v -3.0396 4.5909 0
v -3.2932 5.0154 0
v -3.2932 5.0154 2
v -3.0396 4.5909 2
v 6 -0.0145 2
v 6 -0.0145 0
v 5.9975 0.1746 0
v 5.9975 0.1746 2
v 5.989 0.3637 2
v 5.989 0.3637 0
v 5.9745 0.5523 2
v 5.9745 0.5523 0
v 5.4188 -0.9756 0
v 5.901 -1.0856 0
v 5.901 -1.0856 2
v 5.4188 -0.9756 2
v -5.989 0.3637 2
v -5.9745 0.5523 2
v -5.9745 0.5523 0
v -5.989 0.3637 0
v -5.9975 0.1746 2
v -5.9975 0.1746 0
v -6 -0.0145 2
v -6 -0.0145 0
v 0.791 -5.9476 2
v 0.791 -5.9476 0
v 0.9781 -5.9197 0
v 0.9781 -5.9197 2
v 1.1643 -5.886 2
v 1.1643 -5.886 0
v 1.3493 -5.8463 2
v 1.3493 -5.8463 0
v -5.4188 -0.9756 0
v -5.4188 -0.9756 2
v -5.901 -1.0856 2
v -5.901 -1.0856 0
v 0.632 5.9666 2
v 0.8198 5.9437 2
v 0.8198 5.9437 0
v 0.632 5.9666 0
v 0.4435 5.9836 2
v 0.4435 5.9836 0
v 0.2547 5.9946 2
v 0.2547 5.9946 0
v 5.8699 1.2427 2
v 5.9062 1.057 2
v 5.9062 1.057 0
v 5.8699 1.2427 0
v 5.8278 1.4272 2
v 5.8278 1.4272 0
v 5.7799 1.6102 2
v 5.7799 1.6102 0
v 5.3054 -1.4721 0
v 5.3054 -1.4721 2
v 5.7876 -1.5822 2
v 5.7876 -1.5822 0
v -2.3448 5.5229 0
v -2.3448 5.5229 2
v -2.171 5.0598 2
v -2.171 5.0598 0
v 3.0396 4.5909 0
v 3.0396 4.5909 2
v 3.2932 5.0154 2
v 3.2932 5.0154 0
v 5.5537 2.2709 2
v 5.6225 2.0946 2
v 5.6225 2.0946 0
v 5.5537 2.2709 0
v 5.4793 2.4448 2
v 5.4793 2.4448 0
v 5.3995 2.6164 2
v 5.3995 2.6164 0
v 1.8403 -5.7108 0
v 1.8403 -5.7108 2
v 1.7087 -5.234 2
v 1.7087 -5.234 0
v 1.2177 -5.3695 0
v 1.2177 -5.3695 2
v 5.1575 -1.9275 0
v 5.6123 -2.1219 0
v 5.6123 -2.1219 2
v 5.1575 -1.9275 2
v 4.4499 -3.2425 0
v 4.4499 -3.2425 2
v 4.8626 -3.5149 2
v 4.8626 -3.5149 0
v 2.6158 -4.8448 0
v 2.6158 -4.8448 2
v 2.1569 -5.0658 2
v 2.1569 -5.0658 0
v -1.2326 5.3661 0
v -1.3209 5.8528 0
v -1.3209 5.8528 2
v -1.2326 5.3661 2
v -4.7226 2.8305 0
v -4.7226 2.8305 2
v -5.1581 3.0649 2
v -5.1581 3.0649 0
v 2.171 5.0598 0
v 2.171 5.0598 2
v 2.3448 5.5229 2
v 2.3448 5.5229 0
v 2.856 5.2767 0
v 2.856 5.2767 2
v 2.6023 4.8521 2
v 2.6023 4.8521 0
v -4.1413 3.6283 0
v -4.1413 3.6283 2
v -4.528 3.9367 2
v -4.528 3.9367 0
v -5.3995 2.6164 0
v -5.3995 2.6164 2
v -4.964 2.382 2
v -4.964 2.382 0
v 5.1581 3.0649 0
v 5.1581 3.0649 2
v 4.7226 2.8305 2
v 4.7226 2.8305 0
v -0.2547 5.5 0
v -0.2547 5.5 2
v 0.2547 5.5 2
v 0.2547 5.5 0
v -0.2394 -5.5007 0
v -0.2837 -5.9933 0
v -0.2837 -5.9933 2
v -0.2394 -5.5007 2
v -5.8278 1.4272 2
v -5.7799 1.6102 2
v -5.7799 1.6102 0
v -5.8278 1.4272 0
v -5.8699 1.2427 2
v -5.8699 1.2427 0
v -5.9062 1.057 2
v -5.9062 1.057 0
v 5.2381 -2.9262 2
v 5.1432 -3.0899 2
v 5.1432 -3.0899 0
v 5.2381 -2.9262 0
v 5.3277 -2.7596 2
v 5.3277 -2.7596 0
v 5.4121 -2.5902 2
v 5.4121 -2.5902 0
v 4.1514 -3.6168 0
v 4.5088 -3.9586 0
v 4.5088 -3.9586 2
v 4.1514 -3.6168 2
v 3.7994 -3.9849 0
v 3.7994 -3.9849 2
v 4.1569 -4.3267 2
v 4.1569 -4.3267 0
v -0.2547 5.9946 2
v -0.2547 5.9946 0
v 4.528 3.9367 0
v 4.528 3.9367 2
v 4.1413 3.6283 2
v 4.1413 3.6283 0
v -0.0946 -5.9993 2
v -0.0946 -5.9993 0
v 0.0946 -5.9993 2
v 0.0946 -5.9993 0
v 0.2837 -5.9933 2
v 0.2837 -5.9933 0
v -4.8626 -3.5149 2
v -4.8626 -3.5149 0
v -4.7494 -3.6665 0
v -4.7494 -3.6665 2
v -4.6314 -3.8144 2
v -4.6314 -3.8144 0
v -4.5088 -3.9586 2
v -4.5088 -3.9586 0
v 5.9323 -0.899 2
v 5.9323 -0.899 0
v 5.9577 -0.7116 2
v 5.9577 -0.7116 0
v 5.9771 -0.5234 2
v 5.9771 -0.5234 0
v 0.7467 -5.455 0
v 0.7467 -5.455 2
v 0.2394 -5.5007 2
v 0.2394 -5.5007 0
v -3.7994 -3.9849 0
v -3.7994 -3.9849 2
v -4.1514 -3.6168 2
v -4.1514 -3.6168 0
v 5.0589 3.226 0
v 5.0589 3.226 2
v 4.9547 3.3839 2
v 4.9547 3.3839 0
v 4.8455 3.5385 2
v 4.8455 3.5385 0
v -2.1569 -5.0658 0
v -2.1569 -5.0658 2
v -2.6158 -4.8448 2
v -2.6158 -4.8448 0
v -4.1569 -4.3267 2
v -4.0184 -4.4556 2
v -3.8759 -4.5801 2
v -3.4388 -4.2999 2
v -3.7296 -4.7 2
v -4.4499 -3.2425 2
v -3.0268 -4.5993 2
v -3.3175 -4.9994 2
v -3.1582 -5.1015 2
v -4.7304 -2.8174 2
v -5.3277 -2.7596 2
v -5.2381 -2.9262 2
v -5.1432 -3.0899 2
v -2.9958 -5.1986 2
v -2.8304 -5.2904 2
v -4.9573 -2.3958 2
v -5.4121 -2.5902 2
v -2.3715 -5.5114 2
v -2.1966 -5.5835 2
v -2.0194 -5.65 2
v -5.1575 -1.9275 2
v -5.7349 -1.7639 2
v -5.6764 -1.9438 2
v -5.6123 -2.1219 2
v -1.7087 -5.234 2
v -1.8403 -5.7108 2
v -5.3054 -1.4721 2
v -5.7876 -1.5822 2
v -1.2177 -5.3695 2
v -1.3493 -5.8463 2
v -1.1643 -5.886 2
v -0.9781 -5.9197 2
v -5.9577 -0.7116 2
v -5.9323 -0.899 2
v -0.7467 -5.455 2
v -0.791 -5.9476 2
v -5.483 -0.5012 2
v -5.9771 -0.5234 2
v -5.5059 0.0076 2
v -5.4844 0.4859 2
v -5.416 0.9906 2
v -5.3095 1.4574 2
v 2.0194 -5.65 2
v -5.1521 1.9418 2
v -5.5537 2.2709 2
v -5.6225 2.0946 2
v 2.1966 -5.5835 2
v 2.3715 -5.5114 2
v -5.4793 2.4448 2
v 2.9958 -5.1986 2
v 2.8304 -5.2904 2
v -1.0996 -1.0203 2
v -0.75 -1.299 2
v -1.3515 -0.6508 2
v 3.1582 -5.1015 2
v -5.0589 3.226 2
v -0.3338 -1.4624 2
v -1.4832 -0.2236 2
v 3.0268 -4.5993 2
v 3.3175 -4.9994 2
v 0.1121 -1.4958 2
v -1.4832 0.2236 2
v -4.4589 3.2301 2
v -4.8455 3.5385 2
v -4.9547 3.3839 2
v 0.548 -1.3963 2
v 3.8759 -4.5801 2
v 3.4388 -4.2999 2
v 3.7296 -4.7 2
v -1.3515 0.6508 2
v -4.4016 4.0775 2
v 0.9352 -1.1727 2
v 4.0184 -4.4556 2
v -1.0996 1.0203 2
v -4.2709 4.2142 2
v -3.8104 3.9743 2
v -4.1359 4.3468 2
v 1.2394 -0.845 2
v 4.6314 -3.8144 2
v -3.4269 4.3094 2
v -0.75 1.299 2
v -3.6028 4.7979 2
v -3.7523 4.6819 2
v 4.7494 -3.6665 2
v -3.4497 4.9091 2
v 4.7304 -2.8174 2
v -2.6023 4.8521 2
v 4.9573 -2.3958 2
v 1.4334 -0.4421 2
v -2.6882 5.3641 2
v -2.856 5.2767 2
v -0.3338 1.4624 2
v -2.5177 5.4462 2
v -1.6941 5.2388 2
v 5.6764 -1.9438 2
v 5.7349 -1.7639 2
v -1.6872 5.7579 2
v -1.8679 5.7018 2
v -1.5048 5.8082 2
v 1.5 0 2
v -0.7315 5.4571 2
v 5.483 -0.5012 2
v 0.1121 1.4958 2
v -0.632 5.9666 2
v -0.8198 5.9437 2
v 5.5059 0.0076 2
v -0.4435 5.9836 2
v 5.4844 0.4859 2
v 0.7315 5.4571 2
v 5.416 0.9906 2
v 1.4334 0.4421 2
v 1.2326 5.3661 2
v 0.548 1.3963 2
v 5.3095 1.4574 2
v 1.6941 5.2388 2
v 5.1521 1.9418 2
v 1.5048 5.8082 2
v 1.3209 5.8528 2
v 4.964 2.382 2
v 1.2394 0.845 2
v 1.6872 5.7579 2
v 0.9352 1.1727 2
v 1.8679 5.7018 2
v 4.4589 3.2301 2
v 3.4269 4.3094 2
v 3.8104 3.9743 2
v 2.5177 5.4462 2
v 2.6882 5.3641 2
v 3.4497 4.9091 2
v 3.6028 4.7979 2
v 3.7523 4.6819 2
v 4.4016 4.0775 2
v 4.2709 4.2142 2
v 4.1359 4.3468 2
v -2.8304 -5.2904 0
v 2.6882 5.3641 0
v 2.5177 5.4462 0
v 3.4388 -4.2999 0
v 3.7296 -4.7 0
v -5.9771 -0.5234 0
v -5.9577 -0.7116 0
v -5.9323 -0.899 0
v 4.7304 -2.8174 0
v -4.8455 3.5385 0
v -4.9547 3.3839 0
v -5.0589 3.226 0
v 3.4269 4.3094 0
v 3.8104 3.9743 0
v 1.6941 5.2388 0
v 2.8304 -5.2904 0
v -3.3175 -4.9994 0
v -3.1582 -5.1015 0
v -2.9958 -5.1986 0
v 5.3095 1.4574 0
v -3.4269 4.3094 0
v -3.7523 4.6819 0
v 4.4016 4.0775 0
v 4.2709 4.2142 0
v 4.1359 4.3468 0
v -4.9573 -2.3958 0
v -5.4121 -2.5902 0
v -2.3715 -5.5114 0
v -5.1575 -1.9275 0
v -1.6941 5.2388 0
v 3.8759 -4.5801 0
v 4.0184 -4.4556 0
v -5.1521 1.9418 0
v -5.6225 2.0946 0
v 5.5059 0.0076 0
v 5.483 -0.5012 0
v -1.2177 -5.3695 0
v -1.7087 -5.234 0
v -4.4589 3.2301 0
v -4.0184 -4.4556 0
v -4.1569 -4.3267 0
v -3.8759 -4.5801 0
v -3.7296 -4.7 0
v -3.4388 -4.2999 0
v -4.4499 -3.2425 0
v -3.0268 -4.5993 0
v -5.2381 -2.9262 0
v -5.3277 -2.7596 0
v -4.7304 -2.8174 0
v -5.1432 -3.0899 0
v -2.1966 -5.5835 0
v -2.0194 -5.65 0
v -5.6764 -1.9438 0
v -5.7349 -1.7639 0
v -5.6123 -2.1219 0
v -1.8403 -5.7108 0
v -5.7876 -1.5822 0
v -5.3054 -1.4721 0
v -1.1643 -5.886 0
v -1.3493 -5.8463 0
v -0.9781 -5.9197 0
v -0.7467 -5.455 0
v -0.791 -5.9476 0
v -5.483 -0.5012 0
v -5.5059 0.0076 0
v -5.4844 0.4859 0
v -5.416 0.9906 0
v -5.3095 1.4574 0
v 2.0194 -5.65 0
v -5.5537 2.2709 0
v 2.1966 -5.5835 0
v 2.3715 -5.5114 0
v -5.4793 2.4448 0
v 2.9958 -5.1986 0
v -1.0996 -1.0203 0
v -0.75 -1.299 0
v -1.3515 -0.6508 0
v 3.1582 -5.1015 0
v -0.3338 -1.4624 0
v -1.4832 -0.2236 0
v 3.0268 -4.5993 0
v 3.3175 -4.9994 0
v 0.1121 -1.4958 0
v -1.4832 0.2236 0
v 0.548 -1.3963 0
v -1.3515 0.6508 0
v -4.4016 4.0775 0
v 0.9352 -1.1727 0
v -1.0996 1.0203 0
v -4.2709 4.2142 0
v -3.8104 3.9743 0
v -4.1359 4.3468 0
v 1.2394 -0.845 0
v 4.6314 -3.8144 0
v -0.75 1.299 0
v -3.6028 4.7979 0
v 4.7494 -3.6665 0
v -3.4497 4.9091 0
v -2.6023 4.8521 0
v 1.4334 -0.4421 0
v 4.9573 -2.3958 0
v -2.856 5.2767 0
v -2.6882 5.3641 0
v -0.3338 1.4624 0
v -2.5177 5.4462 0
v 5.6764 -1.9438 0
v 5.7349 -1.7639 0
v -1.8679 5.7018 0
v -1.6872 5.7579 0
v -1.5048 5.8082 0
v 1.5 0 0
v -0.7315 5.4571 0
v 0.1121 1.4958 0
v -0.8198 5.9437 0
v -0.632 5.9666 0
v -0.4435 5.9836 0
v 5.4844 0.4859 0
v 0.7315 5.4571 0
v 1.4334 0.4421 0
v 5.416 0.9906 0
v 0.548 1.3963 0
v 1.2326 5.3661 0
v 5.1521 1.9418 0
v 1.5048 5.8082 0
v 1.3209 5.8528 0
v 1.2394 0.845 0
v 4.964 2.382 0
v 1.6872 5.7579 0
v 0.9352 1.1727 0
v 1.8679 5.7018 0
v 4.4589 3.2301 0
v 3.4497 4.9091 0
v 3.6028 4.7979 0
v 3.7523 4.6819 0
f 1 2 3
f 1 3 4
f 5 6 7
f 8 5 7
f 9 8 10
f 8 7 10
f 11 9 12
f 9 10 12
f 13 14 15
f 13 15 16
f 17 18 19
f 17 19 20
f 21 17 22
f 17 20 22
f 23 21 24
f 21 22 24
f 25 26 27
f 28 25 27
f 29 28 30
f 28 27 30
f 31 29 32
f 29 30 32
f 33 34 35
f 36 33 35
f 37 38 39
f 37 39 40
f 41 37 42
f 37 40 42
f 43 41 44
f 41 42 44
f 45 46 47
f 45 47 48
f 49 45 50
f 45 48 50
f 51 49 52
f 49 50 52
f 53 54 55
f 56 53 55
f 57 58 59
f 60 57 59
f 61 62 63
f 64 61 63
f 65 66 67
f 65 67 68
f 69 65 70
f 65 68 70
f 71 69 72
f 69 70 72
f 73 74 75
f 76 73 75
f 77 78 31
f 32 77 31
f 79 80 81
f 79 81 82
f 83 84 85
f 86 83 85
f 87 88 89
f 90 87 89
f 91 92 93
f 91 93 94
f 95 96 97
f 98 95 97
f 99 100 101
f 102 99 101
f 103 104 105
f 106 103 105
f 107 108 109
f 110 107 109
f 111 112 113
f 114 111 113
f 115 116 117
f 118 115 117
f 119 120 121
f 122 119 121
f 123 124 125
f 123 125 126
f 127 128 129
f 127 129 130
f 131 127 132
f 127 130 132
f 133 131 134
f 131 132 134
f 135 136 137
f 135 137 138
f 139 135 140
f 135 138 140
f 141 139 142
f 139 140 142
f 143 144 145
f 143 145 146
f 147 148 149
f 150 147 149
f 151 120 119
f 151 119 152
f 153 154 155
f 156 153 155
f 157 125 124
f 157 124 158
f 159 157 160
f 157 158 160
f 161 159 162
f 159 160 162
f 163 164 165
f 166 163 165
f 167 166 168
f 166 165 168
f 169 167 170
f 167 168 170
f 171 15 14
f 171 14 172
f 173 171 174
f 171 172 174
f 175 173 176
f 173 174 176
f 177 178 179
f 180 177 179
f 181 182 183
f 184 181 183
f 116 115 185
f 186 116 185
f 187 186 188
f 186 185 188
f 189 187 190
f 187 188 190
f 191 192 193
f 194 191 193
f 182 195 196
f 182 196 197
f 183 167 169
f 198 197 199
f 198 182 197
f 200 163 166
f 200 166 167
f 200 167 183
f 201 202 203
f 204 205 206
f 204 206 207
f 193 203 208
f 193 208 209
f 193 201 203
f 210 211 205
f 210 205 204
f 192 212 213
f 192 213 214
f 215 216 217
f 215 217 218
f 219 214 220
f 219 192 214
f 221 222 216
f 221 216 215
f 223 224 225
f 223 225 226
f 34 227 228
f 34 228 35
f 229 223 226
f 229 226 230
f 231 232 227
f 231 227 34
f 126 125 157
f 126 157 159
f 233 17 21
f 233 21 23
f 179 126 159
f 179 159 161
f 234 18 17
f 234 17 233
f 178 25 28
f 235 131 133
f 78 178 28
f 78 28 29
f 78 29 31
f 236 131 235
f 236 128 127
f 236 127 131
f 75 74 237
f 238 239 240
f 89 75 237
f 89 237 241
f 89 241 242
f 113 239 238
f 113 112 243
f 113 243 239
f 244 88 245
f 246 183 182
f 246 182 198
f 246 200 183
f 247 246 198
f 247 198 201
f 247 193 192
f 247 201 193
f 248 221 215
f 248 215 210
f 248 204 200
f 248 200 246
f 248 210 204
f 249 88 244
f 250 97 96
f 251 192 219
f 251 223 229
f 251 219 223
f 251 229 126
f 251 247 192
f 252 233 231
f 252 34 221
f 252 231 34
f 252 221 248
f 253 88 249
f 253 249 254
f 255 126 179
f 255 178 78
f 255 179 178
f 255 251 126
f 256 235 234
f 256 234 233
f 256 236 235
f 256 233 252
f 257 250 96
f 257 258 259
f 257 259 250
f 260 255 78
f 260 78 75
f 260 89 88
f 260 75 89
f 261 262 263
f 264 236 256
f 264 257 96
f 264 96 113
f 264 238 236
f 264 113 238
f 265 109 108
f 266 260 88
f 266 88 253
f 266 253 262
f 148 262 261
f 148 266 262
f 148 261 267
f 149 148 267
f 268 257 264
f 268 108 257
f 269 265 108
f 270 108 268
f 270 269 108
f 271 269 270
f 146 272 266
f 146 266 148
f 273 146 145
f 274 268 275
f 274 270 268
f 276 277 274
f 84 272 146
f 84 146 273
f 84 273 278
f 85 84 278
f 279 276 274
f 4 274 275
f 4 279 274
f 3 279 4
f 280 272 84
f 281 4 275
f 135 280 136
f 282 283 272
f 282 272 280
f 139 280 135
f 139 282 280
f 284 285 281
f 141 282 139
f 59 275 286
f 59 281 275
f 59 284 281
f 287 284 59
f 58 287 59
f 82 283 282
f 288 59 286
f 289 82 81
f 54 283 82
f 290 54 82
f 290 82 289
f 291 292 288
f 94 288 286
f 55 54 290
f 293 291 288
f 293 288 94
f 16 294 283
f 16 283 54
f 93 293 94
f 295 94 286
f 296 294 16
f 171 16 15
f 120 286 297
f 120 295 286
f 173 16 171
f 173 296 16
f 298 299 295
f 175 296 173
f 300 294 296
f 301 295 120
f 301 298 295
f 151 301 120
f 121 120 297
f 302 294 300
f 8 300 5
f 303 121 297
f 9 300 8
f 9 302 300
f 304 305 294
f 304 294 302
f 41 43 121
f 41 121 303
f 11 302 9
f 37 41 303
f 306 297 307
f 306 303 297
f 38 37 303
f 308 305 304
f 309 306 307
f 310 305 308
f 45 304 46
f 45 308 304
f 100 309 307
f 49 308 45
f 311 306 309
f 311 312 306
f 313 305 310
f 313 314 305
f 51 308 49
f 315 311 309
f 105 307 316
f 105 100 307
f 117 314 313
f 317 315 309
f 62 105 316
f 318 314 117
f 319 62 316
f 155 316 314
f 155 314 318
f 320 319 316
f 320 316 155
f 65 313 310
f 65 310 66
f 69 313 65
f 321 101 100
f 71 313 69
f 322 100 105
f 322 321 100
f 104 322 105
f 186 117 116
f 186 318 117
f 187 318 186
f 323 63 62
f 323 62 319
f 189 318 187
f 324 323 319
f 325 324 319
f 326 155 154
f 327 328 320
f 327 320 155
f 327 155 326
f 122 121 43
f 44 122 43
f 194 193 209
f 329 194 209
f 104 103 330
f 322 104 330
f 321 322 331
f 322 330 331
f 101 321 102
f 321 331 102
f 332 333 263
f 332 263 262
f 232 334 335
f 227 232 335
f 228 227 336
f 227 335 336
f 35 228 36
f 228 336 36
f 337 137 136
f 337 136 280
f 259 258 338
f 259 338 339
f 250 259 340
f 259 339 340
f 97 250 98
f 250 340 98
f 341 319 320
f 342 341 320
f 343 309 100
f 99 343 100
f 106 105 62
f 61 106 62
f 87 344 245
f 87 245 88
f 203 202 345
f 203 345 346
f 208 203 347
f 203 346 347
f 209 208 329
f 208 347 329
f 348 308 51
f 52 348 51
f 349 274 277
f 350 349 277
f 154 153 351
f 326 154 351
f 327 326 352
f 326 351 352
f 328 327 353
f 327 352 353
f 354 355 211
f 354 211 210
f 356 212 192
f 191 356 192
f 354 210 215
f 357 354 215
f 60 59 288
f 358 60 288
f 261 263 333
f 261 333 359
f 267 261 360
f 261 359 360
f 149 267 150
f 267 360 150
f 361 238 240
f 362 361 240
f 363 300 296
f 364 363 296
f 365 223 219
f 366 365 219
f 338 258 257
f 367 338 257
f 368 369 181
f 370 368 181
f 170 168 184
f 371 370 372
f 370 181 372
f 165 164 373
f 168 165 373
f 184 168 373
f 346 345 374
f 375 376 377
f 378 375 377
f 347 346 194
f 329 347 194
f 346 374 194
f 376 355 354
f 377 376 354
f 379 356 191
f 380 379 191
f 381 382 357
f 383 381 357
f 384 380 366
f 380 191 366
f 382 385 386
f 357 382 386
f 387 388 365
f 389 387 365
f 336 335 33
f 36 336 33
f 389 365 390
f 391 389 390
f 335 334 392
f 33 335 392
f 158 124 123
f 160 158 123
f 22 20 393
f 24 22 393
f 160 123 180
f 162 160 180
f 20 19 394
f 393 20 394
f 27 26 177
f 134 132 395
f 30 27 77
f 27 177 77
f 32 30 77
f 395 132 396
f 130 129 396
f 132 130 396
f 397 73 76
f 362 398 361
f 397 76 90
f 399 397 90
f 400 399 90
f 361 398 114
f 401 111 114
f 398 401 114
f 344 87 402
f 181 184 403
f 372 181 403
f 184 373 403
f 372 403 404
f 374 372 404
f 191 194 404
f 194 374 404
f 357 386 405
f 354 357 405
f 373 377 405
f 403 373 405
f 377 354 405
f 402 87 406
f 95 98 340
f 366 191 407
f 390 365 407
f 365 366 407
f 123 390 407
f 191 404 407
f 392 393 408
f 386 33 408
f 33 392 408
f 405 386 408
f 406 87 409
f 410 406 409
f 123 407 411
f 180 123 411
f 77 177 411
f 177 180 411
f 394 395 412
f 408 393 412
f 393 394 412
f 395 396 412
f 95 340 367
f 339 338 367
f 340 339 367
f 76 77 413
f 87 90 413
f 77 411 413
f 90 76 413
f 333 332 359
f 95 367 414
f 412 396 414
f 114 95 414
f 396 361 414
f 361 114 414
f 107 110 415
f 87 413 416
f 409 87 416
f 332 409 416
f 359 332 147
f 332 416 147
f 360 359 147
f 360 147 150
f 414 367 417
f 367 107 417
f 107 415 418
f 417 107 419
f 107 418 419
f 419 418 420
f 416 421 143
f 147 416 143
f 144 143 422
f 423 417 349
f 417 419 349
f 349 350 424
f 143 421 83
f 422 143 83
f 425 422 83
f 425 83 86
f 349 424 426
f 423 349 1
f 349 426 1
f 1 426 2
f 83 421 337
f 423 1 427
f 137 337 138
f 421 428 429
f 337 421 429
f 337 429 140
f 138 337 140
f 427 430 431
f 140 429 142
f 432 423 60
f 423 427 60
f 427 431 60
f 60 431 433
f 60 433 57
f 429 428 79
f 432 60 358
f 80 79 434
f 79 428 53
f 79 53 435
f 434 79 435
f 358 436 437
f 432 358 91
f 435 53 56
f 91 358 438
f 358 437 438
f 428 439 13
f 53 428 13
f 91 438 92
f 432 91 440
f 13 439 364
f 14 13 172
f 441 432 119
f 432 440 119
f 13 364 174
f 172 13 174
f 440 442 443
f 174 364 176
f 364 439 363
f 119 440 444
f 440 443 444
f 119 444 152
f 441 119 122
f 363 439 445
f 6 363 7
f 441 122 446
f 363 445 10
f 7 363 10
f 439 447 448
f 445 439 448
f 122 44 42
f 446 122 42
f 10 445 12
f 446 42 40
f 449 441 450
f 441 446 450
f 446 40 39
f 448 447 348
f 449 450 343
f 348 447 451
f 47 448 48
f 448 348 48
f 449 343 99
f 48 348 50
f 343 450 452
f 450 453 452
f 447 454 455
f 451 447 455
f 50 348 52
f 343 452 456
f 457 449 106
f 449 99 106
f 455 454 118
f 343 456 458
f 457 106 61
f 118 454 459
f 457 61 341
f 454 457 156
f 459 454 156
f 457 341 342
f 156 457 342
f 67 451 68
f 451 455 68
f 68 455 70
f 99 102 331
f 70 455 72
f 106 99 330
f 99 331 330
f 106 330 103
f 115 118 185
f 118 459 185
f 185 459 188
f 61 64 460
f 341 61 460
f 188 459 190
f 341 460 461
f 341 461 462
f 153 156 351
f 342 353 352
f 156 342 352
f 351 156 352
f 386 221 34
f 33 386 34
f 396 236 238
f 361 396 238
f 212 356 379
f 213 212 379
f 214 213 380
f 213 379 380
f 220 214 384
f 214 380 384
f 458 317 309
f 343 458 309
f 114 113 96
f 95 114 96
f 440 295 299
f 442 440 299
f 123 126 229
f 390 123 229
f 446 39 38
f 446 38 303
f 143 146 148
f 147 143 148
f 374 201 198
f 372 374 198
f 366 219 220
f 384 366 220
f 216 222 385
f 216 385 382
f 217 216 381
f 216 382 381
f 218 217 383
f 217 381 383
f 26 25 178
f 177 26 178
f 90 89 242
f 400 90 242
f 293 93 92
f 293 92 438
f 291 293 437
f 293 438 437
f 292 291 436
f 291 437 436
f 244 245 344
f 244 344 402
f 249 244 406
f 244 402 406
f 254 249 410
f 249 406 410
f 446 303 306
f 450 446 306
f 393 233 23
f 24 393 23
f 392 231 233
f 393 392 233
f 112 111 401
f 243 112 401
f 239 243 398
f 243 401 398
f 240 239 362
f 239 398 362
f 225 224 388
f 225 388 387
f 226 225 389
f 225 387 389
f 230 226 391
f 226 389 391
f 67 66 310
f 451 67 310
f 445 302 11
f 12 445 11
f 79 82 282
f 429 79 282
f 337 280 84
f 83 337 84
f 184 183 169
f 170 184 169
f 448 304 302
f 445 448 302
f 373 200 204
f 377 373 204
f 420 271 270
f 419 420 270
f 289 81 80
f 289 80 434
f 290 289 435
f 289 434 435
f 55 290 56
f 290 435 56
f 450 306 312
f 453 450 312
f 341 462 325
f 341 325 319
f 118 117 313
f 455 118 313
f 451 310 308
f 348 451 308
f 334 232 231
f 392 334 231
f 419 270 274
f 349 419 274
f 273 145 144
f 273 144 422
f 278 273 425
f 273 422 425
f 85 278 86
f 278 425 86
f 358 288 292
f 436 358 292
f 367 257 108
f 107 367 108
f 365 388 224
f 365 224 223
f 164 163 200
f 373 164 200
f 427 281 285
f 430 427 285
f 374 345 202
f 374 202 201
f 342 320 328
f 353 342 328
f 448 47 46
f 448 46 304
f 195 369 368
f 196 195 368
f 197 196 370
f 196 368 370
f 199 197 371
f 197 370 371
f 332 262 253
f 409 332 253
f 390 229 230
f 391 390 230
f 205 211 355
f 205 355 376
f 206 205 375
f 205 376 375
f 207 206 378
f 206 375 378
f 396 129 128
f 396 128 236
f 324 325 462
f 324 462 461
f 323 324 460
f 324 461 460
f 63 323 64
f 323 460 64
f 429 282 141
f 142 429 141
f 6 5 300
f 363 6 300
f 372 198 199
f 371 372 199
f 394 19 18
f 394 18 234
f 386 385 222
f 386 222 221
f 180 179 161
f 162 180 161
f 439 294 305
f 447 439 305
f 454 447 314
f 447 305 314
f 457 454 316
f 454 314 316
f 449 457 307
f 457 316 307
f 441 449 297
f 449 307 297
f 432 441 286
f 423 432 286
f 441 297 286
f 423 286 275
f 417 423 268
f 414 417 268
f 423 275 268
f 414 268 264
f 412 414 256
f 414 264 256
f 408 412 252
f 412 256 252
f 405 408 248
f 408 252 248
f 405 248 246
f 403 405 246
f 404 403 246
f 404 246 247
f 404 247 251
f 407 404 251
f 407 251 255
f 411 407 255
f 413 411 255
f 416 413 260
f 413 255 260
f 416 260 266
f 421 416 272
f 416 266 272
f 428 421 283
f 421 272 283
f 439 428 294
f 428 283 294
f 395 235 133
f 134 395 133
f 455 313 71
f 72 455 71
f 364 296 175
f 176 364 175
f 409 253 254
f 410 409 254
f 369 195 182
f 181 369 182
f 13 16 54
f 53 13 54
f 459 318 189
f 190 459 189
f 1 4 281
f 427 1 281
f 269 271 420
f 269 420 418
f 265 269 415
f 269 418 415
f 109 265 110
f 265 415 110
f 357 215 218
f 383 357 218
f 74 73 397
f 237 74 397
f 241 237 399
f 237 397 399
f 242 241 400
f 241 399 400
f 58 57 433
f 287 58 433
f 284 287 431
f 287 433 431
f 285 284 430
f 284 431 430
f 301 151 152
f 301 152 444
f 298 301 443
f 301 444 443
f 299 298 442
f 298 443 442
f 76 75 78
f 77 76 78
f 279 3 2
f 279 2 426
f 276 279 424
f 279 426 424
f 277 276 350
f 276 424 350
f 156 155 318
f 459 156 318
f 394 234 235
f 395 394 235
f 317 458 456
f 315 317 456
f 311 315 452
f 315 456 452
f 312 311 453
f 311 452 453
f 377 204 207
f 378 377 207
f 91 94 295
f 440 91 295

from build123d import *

# Parameters (mm, degrees)
SKETCH1_R           = 6
BOSS_EXTRUDE1_DEPTH = 2
SKETCH2_W           = 0.509324766
SKETCH2_H           = 0.66747415
CUT_EXTRUDE3_DEPTH  = 2
SKETCH3_R           = 1.5
CUT_EXTRUDE4_DEPTH  = 2


with BuildPart() as part:
    # Sketch1 → Boss-Extrude1 (new body)
    with BuildSketch(Plane.XY):
        Circle(SKETCH1_R)
    extrude(amount=BOSS_EXTRUDE1_DEPTH)

    # Sketch2 → Cut-Extrude3 (cut)
    with BuildSketch(Plane.XY.offset(2)):
        with Locations((0, 5.833737075)):
            Rectangle(SKETCH2_W, SKETCH2_H)
        Polygon((1.232632775, 5.366141013), (1.351814887, 6.022888578), (0.850675179, 6.113832027), (0.731493067, 5.457084462), align=None)
        Polygon((2.170985336, 5.059809838), (2.405518948, 5.684722413), (1.928671341, 5.863686313), (1.694137729, 5.238773739), align=None)
        Polygon((3.039560641, 4.590852212), (3.38190765, 5.163844591), (2.944678419, 5.425076896), (2.60233141, 4.852084517), align=None)
        Polygon((3.810441967, 3.974340819), (4.249599059, 4.476996555), (3.86604111, 4.812101043), (3.426884018, 4.309445307), align=None)
        Polygon((4.458852552, 3.230090842), (4.980704856, 3.646254167), (4.663146059, 4.044460304), (4.141293755, 3.628296979), align=None)
        Polygon((4.963951948, 2.382023087), (5.551726702, 2.698318169), (5.310373656, 3.146827283), (4.722598902, 2.8305322), align=None)
        Polygon((5.309505844, 1.45739515), (5.944311483, 1.663656006), (5.786921475, 2.148052644), (5.152115835, 1.941791788), align=None)
        Polygon((5.484407853, 0.485925334), (6.145841203, 0.575522569), (6.077472876, 1.080237825), (5.416039526, 0.99064059), align=None)
        Polygon((5.483036481, -0.501162522), (6.149838529, -0.531108637), (6.172689298, -0.022296726), (5.505887251, 0.007649388), align=None)
        Polygon((5.305435806, -1.472142602), (5.956174985, -1.620669574), (6.069510408, -1.124114642), (5.418771228, -0.975587671), align=None)
        Polygon((4.957314058, -2.395806808), (5.571075076, -2.658140857), (5.771252458, -2.189802589), (5.15749144, -1.92746854), align=None)
        Polygon((4.449860157, -3.242467812), (5.00691623, -3.610177306), (5.287501707, -3.185108478), (4.730445634, -2.817398984), align=None)
        Polygon((3.79938409, -3.984913232), (4.281830977, -4.446179686), (4.633806299, -4.078042361), (4.151359412, -3.616775907), align=None)
        Polygon((3.026792692, -4.599280262), (3.419124153, -5.139278193), (3.831176545, -4.839904606), (3.438845083, -4.299906676), align=None)
        Polygon((2.156917686, -5.065822641), (2.446523866, -5.66719607), (2.905409624, -5.446208335), (2.615803444, -4.844834906), align=None)
        Polygon((1.217717571, -5.369545311), (1.395290288, -6.012965602), (1.886260447, -5.877466447), (1.70868773, -5.234046157), align=None)
        Polygon((0.239379012, -5.500686377), (0.299210933, -6.165473472), (0.806485308, -6.119817952), (0.746653386, -5.455030857), align=None)
        Polygon((-0.746653386, -5.455030857), (-0.806485308, -6.119817952), (-0.299210933, -6.165473472), (-0.239379012, -5.500686377), align=None)
        Polygon((-1.70868773, -5.234046157), (-1.886260447, -5.877466447), (-1.395290288, -6.012965602), (-1.217717571, -5.369545311), align=None)
        Polygon((-2.615803444, -4.844834906), (-2.905409624, -5.446208335), (-2.446523866, -5.667196069), (-2.156917686, -5.065822641), align=None)
        Polygon((-3.438845083, -4.299906676), (-3.831176545, -4.839904606), (-3.419124153, -5.139278193), (-3.026792692, -4.599280262), align=None)
        Polygon((-4.151359412, -3.616775907), (-4.633806299, -4.078042361), (-4.281830977, -4.446179686), (-3.79938409, -3.984913232), align=None)
        Polygon((-4.730445634, -2.817398984), (-5.287501707, -3.185108478), (-5.00691623, -3.610177306), (-4.449860157, -3.242467812), align=None)
        Polygon((-5.15749144, -1.92746854), (-5.771252458, -2.189802589), (-5.571075076, -2.658140857), (-4.957314058, -2.395806808), align=None)
        Polygon((-5.418771228, -0.975587671), (-6.069510408, -1.124114642), (-5.956174985, -1.620669574), (-5.305435806, -1.472142602), align=None)
        Polygon((-5.505887251, 0.007649388), (-6.172689298, -0.022296726), (-6.149838529, -0.531108637), (-5.483036481, -0.501162522), align=None)
        Polygon((-5.416039526, 0.99064059), (-6.077472876, 1.080237825), (-6.145841203, 0.575522569), (-5.484407853, 0.485925334), align=None)
        Polygon((-5.152115835, 1.941791788), (-5.786921475, 2.148052644), (-5.944311483, 1.663656006), (-5.309505844, 1.45739515), align=None)
        Polygon((-4.722598902, 2.8305322), (-5.310373656, 3.146827283), (-5.551726702, 2.698318169), (-4.963951948, 2.382023087), align=None)
        Polygon((-4.141293755, 3.628296979), (-4.663146059, 4.044460304), (-4.980704856, 3.646254167), (-4.458852552, 3.230090842), align=None)
        Polygon((-3.426884018, 4.309445307), (-3.86604111, 4.812101043), (-4.249599059, 4.476996555), (-3.810441967, 3.974340819), align=None)
        Polygon((-2.60233141, 4.852084517), (-2.944678419, 5.425076896), (-3.38190765, 5.163844591), (-3.039560641, 4.590852212), align=None)
        Polygon((-1.694137729, 5.238773739), (-1.928671341, 5.863686313), (-2.405518948, 5.684722413), (-2.170985336, 5.059809838), align=None)
        Polygon((-0.731493067, 5.457084462), (-0.850675179, 6.113832027), (-1.351814887, 6.022888578), (-1.232632775, 5.366141013), align=None)
    extrude(amount=-CUT_EXTRUDE3_DEPTH, mode=Mode.SUBTRACT)

    # Sketch3 → Cut-Extrude4 (cut)
    with BuildSketch(Plane.XY.offset(2)):
        Circle(SKETCH3_R)
    extrude(amount=-CUT_EXTRUDE4_DEPTH, mode=Mode.SUBTRACT)


solid = part.part
